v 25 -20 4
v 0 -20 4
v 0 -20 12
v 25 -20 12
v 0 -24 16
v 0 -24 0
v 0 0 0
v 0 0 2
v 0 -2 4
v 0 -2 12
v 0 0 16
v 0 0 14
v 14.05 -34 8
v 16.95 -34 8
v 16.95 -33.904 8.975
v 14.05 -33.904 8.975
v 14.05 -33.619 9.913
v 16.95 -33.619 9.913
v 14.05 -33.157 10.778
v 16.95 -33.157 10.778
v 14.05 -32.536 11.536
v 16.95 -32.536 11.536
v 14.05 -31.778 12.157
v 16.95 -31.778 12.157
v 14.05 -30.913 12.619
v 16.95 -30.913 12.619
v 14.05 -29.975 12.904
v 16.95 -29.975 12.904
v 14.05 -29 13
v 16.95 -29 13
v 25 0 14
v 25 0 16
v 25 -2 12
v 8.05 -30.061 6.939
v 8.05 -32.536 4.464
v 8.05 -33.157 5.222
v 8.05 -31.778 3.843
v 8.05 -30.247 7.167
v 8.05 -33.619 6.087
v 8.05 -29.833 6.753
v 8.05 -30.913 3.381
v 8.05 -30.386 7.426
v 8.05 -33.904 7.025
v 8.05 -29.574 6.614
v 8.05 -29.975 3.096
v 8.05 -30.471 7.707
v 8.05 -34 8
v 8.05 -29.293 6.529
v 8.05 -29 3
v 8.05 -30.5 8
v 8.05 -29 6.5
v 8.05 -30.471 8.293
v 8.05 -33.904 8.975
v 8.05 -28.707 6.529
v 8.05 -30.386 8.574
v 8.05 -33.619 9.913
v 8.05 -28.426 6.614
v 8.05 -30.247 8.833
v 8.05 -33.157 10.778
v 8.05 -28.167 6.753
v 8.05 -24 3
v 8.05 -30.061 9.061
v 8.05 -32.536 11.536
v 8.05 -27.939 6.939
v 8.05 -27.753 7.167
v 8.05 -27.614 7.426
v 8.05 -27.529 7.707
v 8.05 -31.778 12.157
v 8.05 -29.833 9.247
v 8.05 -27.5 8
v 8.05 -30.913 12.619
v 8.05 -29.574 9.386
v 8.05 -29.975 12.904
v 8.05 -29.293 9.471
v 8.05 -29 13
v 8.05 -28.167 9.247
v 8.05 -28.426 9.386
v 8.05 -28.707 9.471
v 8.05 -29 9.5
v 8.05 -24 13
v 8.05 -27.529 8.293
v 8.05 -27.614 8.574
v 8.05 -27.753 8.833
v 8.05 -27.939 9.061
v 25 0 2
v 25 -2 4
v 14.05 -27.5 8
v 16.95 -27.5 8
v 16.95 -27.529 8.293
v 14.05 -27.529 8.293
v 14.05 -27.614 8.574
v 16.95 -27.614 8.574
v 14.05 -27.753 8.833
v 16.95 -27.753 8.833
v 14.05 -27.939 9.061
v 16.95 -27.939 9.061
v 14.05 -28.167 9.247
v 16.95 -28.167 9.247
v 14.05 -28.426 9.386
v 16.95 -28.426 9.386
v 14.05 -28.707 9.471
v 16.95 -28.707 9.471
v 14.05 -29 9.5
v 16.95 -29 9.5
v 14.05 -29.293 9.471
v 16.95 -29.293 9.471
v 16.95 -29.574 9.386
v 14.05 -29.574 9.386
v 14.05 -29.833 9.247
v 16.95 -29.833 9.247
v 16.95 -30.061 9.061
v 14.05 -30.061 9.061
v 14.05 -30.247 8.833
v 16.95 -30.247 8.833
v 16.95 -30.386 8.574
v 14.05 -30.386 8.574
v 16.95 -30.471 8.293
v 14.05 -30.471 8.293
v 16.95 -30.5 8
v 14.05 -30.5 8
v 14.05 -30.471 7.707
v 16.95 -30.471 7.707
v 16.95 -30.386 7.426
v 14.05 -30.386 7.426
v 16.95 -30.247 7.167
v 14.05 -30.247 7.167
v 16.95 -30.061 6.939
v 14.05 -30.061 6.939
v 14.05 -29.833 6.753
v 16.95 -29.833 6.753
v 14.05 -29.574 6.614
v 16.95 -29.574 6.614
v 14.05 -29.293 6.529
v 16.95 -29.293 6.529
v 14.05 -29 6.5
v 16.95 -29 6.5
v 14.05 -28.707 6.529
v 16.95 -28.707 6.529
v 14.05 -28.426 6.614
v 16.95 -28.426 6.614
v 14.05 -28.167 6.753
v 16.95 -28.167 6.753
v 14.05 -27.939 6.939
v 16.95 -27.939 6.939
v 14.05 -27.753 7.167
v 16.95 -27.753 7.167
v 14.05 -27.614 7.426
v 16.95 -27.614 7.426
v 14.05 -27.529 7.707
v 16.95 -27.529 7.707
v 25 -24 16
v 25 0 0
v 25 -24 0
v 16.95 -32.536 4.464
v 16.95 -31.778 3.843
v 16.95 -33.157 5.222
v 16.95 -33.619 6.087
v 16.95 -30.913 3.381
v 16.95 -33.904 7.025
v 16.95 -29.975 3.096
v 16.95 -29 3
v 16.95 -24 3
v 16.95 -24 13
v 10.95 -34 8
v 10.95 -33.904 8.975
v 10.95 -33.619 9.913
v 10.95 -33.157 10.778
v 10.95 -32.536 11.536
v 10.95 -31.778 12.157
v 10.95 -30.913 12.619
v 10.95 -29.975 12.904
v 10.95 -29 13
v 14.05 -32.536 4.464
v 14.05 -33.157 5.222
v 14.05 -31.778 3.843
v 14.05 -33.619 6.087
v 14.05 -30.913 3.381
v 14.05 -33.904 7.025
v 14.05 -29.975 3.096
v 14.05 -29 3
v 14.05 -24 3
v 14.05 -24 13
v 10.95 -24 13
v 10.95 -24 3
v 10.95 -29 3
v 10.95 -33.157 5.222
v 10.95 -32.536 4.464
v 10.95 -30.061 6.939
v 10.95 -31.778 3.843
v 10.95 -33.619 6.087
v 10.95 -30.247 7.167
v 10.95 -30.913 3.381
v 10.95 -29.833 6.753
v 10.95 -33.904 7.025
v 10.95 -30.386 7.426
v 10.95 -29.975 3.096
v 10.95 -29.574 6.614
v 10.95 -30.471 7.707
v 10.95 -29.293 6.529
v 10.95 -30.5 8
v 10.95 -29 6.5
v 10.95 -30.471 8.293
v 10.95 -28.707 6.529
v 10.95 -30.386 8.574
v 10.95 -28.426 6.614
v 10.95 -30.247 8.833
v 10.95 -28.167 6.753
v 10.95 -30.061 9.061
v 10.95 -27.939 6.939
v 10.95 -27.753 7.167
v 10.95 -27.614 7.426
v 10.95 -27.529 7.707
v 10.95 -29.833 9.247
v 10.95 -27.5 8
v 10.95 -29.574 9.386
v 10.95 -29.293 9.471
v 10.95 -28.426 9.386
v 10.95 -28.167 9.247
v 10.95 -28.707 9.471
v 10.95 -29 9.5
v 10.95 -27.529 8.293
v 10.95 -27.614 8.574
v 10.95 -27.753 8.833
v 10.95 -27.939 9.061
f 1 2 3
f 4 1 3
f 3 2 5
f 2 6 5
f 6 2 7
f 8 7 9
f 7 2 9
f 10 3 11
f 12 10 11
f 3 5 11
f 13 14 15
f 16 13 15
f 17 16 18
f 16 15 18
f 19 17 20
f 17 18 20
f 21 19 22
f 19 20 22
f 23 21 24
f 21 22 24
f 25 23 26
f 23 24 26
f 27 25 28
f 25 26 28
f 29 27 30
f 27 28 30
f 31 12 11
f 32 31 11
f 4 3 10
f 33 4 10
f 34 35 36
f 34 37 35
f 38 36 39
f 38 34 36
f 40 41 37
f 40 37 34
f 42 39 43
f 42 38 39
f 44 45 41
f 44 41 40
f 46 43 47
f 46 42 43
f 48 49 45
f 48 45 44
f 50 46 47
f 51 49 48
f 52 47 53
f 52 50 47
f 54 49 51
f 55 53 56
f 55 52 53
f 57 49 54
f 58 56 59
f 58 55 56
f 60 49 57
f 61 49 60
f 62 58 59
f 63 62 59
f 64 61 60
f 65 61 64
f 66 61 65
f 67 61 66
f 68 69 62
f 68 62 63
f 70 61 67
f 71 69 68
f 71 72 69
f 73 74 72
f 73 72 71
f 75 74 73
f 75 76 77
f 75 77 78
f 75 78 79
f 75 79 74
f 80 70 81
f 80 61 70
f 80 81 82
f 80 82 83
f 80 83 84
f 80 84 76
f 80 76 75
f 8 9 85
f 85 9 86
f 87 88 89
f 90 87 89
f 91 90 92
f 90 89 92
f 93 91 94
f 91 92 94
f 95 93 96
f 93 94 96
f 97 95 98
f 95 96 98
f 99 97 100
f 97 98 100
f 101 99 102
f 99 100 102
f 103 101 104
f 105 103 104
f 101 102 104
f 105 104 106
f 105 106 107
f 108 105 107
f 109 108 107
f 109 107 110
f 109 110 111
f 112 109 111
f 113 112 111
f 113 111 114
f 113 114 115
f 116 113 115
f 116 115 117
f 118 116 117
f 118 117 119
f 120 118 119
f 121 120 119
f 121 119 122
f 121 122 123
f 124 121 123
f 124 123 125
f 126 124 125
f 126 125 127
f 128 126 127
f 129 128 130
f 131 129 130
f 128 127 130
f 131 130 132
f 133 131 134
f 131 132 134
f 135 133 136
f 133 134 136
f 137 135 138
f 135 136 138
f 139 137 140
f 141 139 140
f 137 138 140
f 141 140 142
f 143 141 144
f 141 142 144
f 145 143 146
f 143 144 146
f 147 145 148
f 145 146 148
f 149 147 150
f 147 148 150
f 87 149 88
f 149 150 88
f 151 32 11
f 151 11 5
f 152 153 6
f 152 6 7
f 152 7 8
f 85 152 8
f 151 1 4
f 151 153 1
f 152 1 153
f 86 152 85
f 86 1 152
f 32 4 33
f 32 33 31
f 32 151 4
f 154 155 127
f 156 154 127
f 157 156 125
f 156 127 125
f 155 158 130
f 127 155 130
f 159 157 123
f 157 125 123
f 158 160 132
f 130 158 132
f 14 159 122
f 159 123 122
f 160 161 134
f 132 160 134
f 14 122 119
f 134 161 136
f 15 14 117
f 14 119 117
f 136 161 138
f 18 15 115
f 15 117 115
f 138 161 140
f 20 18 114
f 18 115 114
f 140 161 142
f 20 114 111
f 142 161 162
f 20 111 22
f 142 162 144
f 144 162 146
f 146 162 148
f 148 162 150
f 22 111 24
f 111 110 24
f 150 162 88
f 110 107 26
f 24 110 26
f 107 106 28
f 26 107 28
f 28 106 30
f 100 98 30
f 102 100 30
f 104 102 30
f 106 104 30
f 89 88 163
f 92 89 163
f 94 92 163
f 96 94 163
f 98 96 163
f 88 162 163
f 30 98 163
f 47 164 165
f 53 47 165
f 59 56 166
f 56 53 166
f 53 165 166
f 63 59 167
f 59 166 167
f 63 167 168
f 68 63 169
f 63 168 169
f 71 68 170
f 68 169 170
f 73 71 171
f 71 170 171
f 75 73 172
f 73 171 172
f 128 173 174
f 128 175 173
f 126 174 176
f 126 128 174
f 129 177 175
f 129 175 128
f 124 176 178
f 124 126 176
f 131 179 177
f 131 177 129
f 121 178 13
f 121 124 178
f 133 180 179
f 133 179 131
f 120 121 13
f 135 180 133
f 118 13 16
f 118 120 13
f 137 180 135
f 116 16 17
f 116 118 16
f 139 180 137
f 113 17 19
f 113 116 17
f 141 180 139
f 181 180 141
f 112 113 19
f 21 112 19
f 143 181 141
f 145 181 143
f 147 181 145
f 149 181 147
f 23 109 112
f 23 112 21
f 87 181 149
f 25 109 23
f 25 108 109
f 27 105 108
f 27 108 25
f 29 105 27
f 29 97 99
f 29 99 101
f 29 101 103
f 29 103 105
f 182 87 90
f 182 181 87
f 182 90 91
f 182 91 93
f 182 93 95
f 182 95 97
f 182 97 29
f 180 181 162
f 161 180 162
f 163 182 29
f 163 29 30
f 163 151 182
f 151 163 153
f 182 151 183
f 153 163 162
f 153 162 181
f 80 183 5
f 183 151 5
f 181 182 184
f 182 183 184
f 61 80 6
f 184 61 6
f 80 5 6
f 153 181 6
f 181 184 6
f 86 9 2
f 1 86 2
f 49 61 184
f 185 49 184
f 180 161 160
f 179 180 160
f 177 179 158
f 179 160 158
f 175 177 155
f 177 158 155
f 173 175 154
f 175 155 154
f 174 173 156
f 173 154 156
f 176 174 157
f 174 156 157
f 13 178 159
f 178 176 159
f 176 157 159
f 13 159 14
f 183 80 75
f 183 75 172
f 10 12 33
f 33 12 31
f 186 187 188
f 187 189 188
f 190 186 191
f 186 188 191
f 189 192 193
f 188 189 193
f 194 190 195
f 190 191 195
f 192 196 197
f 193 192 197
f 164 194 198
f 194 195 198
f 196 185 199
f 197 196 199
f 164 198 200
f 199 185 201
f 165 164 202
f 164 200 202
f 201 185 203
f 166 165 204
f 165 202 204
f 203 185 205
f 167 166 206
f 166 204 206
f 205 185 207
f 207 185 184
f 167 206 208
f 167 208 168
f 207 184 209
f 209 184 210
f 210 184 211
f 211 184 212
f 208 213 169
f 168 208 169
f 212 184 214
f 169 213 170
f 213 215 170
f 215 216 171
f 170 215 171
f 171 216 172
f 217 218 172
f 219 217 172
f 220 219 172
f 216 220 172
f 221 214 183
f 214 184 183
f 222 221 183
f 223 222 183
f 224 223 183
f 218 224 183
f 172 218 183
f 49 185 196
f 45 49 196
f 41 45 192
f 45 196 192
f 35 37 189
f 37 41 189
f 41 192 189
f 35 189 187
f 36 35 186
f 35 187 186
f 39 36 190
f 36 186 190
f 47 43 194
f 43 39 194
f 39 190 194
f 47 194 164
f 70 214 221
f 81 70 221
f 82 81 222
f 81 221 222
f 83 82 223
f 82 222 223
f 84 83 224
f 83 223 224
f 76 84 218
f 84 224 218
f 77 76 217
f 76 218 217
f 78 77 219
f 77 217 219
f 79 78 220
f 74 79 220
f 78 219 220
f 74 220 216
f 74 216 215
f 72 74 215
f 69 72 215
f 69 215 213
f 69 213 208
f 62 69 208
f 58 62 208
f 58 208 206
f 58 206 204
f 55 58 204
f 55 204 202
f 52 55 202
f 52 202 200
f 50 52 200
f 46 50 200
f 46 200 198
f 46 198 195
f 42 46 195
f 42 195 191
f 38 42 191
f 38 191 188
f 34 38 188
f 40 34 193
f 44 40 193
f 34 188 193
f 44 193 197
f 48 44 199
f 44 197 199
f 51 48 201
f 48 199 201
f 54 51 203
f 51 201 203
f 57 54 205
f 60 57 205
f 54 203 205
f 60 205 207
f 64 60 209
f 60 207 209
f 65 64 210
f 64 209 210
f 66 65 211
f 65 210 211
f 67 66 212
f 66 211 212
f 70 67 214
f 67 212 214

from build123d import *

# Parameters (mm, degrees)
F1_DEPTH = 25
F2_W     = 2.9
F2_H     = 10
F3_DEPTH = 10
F4_R     = 1.5
F5_DEPTH = 9
F6_SIZE  = 2


with BuildPart() as f1:
    # F0 (on Right) → F1 (new body)
    with BuildSketch(Plane.YZ):
        Polygon((-24, 0), (0, 0), (0, 4), (-20, 4), (-20, 12), (0, 12), (0, 16), (-24, 16), align=None)
    extrude(amount=F1_DEPTH)

    # F2 (on face) → F3 (join)
    with BuildSketch(Plane.XZ.offset(24)):
        with Locations((9.5, 8)):
            Rectangle(F2_W, F2_H)
        with Locations((15.5, 8)):
            Rectangle(F2_W, F2_H)
    extrude(amount=F3_DEPTH)

    # F4 (on face) → F5 (cut)
    with BuildSketch(Plane.YZ.offset(16.95)):
        with BuildLine():
            ThreePointArc((-34, 8), (-32.535534, 11.535534), (-29, 13))
            Line((-29, 13), (-34, 13))
            Line((-34, 13), (-34, 8))
        make_face()
        with BuildLine():
            ThreePointArc((-29, 3), (-32.535534, 4.464466), (-34, 8))
            Line((-34, 8), (-34, 3))
            Line((-34, 3), (-29, 3))
        make_face()
        with Locations((-29, 8)):
            Circle(F4_R)
    extrude(amount=-F5_DEPTH, mode=Mode.SUBTRACT)

    # F6
    f6_edges = [f1.edges().sort_by_distance(p)[0] for p in [
        (12.5, 0, 12),
        (12.5, 0, 4),
    ]]
    chamfer(f6_edges, length=F6_SIZE)


solid = f1.part
